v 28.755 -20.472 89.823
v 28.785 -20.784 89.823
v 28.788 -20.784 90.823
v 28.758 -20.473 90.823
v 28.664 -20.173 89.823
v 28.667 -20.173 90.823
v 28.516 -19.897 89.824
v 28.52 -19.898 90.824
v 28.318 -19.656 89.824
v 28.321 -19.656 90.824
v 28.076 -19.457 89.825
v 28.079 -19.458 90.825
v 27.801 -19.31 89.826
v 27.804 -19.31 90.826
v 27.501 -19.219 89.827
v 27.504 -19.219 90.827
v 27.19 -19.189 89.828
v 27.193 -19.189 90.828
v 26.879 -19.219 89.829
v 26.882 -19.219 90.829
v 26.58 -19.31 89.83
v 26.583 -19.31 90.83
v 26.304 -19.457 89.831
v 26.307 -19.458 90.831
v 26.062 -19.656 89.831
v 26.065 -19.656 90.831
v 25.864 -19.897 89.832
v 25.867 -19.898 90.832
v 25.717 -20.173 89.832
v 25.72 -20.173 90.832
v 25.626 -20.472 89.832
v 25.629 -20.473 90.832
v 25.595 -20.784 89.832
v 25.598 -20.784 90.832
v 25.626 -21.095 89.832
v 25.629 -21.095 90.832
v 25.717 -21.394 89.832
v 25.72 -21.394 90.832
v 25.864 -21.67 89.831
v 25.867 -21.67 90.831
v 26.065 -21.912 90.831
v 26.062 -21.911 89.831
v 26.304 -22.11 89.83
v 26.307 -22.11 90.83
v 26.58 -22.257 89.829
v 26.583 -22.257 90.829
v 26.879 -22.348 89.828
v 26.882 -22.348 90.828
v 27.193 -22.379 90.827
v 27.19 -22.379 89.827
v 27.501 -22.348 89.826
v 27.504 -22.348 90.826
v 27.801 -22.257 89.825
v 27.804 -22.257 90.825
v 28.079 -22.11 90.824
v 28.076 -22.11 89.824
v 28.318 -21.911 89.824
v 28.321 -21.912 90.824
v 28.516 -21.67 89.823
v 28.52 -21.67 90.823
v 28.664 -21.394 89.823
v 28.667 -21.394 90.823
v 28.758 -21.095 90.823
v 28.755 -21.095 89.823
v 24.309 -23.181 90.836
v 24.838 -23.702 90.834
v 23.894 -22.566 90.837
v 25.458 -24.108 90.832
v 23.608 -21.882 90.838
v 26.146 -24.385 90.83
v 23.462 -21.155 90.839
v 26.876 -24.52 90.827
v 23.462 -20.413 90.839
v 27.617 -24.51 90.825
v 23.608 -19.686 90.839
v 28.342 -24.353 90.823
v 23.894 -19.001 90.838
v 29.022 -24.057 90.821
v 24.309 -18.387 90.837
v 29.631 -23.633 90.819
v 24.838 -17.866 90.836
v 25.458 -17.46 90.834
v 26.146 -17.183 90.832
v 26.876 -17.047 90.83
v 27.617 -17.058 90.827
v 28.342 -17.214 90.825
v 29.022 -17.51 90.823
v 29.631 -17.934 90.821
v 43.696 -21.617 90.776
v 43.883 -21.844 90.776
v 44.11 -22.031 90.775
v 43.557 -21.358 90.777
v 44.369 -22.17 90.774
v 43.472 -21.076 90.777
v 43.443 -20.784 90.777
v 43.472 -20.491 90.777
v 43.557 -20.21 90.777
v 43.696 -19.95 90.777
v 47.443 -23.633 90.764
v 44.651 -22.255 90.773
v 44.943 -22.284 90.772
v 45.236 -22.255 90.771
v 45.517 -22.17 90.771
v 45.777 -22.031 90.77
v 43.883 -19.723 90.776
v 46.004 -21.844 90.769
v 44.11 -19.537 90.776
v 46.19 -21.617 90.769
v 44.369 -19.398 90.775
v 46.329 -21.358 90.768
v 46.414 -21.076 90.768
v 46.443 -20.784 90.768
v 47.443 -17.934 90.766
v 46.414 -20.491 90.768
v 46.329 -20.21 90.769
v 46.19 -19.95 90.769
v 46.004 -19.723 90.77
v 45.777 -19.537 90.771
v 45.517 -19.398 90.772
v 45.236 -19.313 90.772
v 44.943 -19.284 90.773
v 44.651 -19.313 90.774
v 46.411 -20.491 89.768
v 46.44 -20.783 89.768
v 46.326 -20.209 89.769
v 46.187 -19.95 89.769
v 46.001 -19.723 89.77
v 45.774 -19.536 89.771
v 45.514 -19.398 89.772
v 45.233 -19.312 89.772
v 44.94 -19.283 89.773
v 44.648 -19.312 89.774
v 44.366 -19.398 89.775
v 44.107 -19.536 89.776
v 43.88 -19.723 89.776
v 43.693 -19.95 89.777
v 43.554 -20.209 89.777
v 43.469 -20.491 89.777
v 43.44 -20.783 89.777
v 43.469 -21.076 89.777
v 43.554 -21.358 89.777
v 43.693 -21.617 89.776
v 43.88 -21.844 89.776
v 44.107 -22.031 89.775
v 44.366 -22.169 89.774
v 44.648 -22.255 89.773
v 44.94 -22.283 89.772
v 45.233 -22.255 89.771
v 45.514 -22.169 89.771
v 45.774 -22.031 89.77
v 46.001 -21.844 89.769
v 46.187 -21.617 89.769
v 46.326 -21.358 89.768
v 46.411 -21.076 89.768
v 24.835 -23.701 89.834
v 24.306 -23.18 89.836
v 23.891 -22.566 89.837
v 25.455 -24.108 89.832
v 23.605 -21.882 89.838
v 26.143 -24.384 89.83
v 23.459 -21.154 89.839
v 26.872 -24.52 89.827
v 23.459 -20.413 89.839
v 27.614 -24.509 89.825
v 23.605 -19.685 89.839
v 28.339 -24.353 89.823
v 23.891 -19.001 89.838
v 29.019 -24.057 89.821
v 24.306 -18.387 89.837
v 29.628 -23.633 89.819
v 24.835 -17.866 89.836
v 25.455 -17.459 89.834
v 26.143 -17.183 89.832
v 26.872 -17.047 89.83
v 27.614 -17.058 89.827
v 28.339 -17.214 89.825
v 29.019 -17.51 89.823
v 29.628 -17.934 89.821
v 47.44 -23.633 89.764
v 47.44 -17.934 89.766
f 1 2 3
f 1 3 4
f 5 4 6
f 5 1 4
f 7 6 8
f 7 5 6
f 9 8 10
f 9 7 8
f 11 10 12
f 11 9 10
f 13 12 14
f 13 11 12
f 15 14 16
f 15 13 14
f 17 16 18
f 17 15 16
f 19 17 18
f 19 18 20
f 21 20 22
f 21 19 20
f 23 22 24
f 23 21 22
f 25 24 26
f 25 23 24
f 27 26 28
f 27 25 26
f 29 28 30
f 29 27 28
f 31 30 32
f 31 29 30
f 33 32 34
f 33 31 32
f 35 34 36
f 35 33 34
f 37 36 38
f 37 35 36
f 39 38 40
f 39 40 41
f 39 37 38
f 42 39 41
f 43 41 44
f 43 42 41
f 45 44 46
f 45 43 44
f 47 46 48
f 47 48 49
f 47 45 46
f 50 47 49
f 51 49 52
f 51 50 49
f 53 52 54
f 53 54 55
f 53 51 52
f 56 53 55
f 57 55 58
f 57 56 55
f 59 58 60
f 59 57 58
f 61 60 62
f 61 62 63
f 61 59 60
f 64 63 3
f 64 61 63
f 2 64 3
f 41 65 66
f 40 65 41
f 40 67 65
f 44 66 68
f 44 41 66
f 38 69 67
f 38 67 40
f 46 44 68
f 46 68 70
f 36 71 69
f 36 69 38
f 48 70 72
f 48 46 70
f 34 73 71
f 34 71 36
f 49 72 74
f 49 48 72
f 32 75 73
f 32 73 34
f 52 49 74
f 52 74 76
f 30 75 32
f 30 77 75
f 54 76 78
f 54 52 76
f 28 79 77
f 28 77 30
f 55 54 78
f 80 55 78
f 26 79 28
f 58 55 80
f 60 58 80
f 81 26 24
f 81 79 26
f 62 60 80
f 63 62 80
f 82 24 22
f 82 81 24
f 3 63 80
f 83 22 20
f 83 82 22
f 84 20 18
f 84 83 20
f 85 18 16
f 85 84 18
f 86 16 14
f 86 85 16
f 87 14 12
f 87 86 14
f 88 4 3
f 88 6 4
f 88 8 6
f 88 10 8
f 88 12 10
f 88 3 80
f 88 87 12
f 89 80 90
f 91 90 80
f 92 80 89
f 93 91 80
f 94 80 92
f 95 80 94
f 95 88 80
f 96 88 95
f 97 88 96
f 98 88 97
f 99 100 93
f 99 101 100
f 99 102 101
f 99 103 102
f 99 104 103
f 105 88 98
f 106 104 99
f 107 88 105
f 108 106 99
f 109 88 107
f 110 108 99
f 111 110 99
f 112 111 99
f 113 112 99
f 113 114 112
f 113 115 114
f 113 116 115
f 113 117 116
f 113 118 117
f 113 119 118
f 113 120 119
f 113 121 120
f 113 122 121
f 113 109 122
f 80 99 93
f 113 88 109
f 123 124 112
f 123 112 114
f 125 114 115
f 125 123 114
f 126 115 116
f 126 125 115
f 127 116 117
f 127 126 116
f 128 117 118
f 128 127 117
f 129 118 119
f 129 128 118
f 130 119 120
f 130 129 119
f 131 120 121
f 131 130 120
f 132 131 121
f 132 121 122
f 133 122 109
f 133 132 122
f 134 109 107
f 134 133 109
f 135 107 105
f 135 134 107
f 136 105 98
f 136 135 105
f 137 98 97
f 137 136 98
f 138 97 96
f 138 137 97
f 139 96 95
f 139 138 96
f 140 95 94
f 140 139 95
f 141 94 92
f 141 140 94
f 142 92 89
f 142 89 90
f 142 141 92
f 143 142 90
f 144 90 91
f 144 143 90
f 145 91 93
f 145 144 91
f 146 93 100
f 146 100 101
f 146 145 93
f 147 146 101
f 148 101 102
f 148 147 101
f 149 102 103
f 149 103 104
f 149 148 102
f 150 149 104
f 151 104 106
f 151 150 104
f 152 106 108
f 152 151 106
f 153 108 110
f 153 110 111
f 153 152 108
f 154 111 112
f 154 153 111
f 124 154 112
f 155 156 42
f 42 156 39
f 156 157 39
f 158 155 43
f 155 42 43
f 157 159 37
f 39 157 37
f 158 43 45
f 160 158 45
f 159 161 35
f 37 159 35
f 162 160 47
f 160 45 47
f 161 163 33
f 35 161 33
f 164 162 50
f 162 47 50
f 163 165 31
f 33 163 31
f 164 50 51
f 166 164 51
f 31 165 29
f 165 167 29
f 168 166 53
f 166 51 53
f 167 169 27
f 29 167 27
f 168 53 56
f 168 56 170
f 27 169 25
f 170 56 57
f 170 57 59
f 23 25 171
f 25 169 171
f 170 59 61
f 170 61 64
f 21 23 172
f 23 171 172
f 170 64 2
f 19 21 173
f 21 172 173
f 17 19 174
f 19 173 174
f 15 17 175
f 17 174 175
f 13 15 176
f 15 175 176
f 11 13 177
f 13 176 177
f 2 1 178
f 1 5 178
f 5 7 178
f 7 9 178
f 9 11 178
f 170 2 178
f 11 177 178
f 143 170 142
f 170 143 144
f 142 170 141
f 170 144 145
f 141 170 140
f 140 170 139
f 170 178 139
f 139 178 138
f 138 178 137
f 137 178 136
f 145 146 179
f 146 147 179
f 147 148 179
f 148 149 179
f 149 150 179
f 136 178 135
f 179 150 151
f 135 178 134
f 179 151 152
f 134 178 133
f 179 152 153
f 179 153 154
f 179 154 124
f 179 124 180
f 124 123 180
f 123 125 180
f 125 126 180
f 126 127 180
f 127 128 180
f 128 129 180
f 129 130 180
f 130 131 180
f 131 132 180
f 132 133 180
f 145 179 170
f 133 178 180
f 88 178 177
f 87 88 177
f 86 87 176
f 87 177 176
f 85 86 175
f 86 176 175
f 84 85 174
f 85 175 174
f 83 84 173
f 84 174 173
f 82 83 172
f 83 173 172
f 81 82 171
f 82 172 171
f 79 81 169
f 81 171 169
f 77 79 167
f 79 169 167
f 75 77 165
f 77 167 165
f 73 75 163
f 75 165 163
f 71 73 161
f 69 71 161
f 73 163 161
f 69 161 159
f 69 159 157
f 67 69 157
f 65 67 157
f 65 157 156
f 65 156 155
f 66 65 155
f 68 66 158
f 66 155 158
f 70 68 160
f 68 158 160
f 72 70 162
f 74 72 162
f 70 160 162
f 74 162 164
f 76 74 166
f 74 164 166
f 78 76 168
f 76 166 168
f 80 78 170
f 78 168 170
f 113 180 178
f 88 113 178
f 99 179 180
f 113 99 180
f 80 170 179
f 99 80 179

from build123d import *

# Parameters (mm, degrees)
SKETCH1_R           = 1.595
SKETCH1_R_2         = 1.5
BOSS_EXTRUDE1_DEPTH = 1


with BuildPart() as part:
    # Sketch1 → Boss-Extrude1 (new body)
    with BuildSketch(Plane(origin=(0.276968936, -0.030405965, 89.917439906), x_dir=(0.999995256, 1.042e-06, -0.003080243), z_dir=(0.003080243, -0.000338153, 0.999995199))):
        with BuildLine():
            Line((29.351122384, -23.602694705), (47.163406232, -23.602694705))
            Line((47.163406232, -23.602694705), (47.163406232, -17.90355794))
            Line((47.163406232, -17.90355794), (29.351122384, -17.90355794))
            ThreePointArc((29.351122384, -17.90355794), (23.163406232, -20.753126322), (29.351122384, -23.602694705))
        make_face()
        with Locations((26.913406232, -20.753126322)):
            Circle(SKETCH1_R, mode=Mode.SUBTRACT)
        with Locations((44.663406232, -20.753126322)):
            Circle(SKETCH1_R_2, mode=Mode.SUBTRACT)
    extrude(amount=BOSS_EXTRUDE1_DEPTH)


solid = part.part
